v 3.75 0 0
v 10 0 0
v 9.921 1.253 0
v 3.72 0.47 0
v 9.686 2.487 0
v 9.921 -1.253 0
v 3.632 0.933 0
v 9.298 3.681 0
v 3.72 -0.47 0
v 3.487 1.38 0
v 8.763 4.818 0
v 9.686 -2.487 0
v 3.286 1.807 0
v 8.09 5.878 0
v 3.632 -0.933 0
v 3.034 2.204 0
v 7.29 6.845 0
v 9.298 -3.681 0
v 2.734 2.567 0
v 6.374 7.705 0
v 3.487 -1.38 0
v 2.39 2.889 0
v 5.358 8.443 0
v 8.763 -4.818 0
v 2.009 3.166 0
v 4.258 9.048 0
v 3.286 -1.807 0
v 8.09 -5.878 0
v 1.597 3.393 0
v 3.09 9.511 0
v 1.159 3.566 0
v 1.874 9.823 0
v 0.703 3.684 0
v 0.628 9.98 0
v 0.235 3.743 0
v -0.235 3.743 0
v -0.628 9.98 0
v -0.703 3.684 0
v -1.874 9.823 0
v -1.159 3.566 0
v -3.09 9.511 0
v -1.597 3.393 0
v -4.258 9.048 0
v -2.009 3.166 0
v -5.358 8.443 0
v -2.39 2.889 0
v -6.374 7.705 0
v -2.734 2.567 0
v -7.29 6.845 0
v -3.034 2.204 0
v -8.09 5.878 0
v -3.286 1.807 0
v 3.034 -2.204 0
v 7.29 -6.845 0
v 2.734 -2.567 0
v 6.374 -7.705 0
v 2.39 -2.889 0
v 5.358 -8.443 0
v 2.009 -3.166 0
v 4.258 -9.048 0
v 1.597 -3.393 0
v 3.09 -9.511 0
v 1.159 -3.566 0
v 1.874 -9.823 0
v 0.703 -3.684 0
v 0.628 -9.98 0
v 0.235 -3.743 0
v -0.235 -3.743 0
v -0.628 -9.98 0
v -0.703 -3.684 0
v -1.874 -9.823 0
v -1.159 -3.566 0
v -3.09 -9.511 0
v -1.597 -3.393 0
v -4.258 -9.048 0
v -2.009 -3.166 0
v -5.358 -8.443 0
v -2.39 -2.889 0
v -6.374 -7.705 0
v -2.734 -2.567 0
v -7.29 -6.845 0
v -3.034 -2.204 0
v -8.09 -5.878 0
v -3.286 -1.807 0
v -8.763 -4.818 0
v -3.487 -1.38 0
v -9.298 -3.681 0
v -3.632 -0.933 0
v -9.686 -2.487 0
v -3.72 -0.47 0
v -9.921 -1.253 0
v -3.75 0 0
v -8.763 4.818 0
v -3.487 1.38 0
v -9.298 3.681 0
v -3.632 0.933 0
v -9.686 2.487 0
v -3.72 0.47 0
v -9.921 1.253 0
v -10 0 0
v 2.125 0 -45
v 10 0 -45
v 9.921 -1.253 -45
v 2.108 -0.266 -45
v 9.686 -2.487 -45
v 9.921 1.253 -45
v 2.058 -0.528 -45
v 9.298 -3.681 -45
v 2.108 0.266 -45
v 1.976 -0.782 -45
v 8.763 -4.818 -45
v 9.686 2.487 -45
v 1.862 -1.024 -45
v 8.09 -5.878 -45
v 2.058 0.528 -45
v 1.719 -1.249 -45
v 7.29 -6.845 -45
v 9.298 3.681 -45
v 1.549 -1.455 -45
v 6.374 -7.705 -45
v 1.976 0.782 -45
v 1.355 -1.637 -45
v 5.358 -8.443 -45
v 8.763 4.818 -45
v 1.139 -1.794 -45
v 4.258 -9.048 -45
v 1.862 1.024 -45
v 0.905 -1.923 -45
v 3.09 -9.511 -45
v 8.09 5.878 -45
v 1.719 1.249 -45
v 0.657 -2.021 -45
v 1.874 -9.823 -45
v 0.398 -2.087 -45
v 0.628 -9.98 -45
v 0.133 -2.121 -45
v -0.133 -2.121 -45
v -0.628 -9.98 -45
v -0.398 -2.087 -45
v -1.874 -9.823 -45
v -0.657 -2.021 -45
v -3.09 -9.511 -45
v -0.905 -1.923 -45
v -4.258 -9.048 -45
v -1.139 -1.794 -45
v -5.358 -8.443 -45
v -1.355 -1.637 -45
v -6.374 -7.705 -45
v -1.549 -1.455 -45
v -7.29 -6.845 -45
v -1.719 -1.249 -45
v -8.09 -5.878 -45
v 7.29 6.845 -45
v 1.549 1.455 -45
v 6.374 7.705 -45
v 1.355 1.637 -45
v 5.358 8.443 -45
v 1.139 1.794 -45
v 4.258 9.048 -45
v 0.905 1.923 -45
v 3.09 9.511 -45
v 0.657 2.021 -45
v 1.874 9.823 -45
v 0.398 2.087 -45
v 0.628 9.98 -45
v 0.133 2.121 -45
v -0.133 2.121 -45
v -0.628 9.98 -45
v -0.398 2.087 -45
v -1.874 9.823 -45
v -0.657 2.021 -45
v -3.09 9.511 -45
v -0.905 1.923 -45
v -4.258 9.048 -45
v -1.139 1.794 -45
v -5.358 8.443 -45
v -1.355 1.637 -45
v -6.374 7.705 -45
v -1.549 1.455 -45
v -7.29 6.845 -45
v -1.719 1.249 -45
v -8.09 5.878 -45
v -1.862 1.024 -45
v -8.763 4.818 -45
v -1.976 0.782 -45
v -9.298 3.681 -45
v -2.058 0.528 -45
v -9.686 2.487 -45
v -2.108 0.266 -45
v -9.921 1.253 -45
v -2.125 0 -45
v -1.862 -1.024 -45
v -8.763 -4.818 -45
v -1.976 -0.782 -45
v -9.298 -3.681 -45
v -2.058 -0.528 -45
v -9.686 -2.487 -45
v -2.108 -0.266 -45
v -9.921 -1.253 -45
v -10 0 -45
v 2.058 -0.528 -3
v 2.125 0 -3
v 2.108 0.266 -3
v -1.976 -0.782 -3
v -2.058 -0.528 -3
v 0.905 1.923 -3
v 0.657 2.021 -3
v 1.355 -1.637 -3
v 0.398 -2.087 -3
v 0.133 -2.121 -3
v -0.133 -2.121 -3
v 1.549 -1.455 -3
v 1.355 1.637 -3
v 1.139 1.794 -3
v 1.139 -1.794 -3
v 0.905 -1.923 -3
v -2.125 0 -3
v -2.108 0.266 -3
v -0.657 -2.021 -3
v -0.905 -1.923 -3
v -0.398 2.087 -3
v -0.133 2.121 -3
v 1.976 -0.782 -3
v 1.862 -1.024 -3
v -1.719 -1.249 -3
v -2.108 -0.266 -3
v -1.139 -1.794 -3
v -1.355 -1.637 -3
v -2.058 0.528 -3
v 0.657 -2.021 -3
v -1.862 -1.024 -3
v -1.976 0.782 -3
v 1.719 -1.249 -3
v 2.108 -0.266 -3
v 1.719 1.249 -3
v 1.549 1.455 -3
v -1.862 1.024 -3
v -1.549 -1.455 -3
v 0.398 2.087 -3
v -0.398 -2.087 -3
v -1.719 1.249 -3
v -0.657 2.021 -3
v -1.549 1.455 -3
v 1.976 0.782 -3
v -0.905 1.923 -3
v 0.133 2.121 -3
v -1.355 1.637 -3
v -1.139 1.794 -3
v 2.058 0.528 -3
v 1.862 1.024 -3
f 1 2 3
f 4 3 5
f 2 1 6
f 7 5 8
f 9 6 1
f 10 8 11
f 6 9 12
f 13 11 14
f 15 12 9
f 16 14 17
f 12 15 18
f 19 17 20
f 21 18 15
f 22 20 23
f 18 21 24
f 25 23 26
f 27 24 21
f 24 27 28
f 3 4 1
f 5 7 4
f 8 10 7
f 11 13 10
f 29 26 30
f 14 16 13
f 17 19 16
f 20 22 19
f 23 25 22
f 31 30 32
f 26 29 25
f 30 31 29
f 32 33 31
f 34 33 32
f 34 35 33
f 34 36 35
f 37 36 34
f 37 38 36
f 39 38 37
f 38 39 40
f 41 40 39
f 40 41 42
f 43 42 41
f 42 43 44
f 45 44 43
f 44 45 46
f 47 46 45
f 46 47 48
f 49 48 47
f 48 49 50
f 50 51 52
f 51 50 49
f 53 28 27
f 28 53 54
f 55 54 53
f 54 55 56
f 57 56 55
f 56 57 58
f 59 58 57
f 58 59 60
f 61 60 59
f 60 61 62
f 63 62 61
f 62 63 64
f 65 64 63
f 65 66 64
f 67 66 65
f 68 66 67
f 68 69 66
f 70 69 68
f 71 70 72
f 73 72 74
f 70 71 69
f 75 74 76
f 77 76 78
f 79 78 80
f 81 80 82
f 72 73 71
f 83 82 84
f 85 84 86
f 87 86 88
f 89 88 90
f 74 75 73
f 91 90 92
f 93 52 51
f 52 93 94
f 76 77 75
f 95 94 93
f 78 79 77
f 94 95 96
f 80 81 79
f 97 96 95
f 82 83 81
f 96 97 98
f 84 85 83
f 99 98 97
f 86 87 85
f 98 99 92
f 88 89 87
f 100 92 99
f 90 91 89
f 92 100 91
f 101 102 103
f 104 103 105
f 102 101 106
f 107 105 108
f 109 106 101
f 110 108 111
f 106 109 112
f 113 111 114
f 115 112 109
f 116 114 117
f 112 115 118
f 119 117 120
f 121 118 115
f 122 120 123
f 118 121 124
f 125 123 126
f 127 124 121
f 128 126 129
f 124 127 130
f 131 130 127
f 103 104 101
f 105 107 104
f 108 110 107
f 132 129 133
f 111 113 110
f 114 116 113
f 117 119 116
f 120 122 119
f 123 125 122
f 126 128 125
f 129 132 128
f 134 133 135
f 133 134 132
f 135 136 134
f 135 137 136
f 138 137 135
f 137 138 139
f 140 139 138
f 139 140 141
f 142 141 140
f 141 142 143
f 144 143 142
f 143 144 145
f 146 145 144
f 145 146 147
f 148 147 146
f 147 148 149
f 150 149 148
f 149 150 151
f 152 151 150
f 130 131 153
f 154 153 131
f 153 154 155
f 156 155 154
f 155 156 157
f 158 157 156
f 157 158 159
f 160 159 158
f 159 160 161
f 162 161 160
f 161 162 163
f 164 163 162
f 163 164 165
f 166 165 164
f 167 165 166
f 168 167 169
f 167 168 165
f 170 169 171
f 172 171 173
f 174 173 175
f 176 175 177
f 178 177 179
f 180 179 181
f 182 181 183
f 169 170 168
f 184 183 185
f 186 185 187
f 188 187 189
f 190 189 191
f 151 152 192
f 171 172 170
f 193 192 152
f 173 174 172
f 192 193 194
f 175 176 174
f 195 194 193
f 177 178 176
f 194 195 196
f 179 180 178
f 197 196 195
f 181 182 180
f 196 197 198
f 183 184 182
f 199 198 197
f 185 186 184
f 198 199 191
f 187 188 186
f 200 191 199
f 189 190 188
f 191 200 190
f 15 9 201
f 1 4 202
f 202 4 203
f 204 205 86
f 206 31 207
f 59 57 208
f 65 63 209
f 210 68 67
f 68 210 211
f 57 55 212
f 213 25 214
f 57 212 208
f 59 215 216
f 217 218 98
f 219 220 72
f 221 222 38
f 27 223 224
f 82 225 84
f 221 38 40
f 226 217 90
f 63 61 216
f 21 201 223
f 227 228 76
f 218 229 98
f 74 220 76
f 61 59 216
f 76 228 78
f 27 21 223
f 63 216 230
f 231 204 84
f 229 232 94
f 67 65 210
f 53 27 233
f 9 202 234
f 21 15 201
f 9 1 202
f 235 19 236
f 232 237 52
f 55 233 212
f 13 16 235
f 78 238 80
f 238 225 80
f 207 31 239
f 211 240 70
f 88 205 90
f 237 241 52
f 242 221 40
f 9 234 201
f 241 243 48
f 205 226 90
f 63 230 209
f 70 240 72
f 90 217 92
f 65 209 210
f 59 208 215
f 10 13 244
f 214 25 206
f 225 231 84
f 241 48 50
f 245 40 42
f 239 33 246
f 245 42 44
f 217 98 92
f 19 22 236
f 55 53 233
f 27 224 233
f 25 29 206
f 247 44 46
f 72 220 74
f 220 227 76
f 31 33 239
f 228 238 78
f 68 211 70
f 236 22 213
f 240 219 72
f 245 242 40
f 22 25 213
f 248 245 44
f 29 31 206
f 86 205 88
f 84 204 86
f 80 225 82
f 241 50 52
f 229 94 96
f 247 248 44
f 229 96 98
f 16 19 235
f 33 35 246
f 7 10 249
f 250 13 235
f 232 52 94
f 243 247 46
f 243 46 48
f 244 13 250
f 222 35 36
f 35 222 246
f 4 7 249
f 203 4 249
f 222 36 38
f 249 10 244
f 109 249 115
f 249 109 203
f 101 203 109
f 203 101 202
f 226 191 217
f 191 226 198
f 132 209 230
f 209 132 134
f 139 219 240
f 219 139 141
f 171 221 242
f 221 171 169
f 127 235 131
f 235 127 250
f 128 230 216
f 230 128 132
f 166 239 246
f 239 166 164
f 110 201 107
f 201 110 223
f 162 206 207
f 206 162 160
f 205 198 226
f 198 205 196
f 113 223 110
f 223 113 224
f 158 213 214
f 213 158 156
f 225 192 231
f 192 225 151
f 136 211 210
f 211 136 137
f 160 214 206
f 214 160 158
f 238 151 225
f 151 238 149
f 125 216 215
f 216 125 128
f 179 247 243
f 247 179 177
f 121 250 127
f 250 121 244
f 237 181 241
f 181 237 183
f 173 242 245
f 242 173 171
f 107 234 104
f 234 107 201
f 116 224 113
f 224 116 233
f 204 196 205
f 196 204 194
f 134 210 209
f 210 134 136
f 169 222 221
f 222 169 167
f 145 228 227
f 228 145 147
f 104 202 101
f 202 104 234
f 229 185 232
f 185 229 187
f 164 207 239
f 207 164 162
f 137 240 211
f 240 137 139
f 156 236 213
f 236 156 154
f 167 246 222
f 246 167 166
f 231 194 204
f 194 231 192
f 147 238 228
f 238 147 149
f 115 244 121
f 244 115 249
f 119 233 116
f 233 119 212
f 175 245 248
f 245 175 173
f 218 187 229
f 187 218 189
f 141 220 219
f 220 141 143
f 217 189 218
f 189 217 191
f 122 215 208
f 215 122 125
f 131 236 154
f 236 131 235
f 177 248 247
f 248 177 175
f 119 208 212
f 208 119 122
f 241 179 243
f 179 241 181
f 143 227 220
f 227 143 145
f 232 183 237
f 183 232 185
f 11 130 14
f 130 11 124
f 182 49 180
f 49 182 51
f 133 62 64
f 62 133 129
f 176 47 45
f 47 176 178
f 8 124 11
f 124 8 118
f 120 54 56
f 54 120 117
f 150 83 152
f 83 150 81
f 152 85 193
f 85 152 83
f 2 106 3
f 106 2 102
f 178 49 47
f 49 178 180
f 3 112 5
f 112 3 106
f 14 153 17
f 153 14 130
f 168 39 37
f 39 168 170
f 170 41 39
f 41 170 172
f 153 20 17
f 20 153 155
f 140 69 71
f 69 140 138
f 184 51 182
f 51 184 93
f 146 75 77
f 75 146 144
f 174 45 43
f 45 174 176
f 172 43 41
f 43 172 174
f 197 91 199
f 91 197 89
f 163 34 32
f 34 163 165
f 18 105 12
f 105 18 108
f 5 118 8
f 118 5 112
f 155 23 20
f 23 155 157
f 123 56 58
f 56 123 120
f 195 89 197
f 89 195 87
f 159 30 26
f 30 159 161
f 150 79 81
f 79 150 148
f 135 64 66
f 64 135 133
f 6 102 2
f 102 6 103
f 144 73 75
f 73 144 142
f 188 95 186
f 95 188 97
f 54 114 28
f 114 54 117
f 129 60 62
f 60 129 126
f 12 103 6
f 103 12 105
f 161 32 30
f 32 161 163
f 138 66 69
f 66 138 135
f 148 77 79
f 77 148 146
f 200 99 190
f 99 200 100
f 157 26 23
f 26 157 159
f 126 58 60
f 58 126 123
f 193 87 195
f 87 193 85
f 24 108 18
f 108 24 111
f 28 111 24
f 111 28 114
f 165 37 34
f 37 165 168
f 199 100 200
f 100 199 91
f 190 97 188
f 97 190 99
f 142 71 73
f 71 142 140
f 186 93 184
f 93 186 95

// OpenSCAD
$fn = 50;


difference() {
	union() {
		translate(v = [0, 0, -45.0000000000]) {
			cylinder(h = 45, r = 10.0000000000);
		}
		cylinder(h = 0, r = 16.0000000000);
	}
	union() {
		translate(v = [0, 0, 0]) {
			rotate(a = [0, 0, 0]) {
				difference() {
					union() {
						#translate(v = [0, 0, -45.0000000000]) {
							cylinder(h = 45, r = 2.0000000000);
						}
						#translate(v = [0, 0, -3]) {
							cylinder(h = 3, r1 = 2.1250000000, r2 = 3.7500000000);
						}
						#translate(v = [0, 0, -45.0000000000]) {
							cylinder(h = 45, r = 2.1250000000);
						}
						#translate(v = [0, 0, -45.0000000000]) {
							cylinder(h = 45, r = 2.0000000000);
						}
					}
					union();
				}
			}
		}
	}
}
